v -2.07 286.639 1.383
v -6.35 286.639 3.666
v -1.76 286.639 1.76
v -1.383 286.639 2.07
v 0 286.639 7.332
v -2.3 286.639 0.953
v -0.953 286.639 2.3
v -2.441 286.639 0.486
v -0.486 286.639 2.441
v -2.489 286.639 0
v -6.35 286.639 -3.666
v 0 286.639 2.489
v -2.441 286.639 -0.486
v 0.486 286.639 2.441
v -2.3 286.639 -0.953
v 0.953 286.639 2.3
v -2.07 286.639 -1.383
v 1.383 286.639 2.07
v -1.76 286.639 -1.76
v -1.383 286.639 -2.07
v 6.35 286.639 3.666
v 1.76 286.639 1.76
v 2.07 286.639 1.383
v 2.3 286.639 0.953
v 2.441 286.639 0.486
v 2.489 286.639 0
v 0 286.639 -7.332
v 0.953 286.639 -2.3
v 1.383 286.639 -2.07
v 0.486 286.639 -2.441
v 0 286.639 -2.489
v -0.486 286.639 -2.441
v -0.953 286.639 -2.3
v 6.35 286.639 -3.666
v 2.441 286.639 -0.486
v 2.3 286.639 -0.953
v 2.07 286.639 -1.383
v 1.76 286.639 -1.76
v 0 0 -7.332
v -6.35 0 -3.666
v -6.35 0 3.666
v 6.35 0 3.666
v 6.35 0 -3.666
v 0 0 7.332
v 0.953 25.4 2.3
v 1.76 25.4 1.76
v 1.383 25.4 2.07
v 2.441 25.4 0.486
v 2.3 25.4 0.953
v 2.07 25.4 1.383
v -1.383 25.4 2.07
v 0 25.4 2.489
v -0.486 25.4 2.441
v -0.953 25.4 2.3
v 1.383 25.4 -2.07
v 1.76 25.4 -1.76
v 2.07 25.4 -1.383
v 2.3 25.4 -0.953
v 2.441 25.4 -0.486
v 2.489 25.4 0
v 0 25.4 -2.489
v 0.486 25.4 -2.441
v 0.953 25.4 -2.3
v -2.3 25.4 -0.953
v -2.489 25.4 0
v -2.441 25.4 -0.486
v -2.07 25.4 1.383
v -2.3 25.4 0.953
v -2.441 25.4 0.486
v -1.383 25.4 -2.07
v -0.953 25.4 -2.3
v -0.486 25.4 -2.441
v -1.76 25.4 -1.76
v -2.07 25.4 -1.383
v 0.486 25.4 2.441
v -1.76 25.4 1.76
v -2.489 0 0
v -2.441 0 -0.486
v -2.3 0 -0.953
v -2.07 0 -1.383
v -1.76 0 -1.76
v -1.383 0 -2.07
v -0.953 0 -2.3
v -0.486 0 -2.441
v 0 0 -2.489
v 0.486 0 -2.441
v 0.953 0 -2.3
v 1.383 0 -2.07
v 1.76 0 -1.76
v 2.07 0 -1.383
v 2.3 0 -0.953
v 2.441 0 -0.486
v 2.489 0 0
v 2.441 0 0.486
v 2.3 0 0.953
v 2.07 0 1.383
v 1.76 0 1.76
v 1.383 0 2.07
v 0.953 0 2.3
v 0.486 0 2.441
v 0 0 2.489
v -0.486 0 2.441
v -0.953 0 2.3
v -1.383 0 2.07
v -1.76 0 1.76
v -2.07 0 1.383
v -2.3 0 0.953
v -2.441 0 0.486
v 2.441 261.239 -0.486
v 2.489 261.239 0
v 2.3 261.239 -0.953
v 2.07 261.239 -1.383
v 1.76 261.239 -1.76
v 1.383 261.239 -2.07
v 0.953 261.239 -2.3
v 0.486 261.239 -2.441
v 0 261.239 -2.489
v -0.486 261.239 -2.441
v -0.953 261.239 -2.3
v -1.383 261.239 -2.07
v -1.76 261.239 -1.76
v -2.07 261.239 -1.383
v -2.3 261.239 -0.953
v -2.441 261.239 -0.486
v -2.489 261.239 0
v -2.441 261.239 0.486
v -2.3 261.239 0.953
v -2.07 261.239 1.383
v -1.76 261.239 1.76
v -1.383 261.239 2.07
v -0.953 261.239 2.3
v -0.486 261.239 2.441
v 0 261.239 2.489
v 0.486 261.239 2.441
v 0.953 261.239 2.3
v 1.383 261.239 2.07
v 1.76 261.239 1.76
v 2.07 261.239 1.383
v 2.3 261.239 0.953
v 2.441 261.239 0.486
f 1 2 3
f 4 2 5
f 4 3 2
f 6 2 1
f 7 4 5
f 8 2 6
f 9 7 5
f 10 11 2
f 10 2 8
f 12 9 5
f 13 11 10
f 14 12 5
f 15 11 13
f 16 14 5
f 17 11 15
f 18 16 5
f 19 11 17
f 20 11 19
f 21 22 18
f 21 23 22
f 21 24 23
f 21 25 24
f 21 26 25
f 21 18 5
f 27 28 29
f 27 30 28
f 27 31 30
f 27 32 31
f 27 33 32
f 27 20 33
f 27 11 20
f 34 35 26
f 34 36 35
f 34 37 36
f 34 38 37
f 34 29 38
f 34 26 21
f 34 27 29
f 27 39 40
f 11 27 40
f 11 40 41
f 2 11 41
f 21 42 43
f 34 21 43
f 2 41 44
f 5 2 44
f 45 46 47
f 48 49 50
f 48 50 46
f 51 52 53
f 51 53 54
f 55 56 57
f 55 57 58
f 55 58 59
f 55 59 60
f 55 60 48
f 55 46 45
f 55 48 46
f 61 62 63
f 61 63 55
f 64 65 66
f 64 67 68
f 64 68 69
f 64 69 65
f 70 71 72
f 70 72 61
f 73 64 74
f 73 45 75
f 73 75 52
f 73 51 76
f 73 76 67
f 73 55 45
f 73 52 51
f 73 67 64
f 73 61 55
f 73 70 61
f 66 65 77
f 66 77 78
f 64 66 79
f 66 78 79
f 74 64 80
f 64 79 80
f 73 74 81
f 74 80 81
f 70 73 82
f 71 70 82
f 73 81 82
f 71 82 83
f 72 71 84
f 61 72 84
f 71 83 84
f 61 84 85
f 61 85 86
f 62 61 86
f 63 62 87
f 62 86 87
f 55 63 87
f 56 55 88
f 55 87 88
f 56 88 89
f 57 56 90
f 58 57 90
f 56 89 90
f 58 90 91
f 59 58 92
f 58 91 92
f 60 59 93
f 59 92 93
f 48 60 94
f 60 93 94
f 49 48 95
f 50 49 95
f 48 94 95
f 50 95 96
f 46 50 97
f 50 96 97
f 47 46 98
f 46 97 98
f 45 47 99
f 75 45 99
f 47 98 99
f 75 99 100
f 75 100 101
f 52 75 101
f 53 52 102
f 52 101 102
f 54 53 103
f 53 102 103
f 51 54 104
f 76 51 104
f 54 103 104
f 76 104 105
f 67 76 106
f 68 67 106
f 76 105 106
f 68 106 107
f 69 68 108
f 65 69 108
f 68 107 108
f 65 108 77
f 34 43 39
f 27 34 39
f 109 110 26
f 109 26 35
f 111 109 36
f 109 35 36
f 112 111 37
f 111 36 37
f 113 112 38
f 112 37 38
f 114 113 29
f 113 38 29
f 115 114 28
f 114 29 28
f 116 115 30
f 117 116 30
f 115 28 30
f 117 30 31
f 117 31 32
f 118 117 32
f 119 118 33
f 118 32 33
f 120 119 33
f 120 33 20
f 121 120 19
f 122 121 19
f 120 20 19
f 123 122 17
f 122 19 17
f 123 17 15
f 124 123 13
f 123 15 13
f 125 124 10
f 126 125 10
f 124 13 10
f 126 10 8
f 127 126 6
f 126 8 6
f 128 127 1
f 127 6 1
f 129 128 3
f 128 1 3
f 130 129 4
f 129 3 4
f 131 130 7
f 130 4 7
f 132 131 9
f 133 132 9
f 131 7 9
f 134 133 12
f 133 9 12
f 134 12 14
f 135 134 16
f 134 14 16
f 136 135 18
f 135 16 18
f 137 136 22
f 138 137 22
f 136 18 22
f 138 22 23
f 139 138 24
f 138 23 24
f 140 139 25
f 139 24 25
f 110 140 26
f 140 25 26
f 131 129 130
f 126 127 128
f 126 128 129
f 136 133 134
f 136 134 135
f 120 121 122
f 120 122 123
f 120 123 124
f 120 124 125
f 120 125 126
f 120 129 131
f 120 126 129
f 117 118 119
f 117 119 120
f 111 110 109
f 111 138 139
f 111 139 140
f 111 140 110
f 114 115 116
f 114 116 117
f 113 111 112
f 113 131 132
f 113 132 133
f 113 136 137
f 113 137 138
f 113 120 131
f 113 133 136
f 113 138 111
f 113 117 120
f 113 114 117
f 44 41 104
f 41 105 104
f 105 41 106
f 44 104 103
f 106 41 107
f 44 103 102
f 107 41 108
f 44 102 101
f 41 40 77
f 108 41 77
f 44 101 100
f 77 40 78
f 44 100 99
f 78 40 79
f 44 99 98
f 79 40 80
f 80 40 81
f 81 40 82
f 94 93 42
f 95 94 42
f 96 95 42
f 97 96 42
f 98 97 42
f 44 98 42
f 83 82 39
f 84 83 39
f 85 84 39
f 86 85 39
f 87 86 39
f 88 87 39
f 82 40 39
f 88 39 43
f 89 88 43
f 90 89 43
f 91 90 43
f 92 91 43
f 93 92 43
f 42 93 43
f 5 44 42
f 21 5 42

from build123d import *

# Parameters (mm, degrees)
BOSS_EXTRUDE1_DEPTH = 286.639
SKETCH2_R           = 2.4892
CUT_EXTRUDE1_DEPTH  = 25.4
SKETCH3_R           = 2.4892
CUT_EXTRUDE2_DEPTH  = 25.4


with BuildPart() as part:
    # Sketch1 → Boss-Extrude1 (new body)
    with BuildSketch(Plane(origin=(0, 0, 0), x_dir=(1, 0, 0), z_dir=(0, 1, 0))):
        Polygon((0, 7.332348419), (-6.35, 3.666174209), (-6.35, -3.666174209), (0, -7.332348419), (6.35, -3.666174209), (6.35, 3.666174209), align=None)
    extrude(amount=BOSS_EXTRUDE1_DEPTH)

    # Sketch2 → Cut-Extrude1 (cut)
    with BuildSketch(Plane(origin=(0, 286.639, 0), x_dir=(1, 0, 0), z_dir=(0, 1, 0))):
        Circle(SKETCH2_R)
    extrude(amount=-CUT_EXTRUDE1_DEPTH, mode=Mode.SUBTRACT)

    # Sketch3 → Cut-Extrude2 (cut)
    with BuildSketch(Plane(origin=(0, 0, 0), x_dir=(-1, 0, 0), z_dir=(0, -1, 0))):
        Circle(SKETCH3_R)
    extrude(amount=-CUT_EXTRUDE2_DEPTH, mode=Mode.SUBTRACT)


solid = part.part
